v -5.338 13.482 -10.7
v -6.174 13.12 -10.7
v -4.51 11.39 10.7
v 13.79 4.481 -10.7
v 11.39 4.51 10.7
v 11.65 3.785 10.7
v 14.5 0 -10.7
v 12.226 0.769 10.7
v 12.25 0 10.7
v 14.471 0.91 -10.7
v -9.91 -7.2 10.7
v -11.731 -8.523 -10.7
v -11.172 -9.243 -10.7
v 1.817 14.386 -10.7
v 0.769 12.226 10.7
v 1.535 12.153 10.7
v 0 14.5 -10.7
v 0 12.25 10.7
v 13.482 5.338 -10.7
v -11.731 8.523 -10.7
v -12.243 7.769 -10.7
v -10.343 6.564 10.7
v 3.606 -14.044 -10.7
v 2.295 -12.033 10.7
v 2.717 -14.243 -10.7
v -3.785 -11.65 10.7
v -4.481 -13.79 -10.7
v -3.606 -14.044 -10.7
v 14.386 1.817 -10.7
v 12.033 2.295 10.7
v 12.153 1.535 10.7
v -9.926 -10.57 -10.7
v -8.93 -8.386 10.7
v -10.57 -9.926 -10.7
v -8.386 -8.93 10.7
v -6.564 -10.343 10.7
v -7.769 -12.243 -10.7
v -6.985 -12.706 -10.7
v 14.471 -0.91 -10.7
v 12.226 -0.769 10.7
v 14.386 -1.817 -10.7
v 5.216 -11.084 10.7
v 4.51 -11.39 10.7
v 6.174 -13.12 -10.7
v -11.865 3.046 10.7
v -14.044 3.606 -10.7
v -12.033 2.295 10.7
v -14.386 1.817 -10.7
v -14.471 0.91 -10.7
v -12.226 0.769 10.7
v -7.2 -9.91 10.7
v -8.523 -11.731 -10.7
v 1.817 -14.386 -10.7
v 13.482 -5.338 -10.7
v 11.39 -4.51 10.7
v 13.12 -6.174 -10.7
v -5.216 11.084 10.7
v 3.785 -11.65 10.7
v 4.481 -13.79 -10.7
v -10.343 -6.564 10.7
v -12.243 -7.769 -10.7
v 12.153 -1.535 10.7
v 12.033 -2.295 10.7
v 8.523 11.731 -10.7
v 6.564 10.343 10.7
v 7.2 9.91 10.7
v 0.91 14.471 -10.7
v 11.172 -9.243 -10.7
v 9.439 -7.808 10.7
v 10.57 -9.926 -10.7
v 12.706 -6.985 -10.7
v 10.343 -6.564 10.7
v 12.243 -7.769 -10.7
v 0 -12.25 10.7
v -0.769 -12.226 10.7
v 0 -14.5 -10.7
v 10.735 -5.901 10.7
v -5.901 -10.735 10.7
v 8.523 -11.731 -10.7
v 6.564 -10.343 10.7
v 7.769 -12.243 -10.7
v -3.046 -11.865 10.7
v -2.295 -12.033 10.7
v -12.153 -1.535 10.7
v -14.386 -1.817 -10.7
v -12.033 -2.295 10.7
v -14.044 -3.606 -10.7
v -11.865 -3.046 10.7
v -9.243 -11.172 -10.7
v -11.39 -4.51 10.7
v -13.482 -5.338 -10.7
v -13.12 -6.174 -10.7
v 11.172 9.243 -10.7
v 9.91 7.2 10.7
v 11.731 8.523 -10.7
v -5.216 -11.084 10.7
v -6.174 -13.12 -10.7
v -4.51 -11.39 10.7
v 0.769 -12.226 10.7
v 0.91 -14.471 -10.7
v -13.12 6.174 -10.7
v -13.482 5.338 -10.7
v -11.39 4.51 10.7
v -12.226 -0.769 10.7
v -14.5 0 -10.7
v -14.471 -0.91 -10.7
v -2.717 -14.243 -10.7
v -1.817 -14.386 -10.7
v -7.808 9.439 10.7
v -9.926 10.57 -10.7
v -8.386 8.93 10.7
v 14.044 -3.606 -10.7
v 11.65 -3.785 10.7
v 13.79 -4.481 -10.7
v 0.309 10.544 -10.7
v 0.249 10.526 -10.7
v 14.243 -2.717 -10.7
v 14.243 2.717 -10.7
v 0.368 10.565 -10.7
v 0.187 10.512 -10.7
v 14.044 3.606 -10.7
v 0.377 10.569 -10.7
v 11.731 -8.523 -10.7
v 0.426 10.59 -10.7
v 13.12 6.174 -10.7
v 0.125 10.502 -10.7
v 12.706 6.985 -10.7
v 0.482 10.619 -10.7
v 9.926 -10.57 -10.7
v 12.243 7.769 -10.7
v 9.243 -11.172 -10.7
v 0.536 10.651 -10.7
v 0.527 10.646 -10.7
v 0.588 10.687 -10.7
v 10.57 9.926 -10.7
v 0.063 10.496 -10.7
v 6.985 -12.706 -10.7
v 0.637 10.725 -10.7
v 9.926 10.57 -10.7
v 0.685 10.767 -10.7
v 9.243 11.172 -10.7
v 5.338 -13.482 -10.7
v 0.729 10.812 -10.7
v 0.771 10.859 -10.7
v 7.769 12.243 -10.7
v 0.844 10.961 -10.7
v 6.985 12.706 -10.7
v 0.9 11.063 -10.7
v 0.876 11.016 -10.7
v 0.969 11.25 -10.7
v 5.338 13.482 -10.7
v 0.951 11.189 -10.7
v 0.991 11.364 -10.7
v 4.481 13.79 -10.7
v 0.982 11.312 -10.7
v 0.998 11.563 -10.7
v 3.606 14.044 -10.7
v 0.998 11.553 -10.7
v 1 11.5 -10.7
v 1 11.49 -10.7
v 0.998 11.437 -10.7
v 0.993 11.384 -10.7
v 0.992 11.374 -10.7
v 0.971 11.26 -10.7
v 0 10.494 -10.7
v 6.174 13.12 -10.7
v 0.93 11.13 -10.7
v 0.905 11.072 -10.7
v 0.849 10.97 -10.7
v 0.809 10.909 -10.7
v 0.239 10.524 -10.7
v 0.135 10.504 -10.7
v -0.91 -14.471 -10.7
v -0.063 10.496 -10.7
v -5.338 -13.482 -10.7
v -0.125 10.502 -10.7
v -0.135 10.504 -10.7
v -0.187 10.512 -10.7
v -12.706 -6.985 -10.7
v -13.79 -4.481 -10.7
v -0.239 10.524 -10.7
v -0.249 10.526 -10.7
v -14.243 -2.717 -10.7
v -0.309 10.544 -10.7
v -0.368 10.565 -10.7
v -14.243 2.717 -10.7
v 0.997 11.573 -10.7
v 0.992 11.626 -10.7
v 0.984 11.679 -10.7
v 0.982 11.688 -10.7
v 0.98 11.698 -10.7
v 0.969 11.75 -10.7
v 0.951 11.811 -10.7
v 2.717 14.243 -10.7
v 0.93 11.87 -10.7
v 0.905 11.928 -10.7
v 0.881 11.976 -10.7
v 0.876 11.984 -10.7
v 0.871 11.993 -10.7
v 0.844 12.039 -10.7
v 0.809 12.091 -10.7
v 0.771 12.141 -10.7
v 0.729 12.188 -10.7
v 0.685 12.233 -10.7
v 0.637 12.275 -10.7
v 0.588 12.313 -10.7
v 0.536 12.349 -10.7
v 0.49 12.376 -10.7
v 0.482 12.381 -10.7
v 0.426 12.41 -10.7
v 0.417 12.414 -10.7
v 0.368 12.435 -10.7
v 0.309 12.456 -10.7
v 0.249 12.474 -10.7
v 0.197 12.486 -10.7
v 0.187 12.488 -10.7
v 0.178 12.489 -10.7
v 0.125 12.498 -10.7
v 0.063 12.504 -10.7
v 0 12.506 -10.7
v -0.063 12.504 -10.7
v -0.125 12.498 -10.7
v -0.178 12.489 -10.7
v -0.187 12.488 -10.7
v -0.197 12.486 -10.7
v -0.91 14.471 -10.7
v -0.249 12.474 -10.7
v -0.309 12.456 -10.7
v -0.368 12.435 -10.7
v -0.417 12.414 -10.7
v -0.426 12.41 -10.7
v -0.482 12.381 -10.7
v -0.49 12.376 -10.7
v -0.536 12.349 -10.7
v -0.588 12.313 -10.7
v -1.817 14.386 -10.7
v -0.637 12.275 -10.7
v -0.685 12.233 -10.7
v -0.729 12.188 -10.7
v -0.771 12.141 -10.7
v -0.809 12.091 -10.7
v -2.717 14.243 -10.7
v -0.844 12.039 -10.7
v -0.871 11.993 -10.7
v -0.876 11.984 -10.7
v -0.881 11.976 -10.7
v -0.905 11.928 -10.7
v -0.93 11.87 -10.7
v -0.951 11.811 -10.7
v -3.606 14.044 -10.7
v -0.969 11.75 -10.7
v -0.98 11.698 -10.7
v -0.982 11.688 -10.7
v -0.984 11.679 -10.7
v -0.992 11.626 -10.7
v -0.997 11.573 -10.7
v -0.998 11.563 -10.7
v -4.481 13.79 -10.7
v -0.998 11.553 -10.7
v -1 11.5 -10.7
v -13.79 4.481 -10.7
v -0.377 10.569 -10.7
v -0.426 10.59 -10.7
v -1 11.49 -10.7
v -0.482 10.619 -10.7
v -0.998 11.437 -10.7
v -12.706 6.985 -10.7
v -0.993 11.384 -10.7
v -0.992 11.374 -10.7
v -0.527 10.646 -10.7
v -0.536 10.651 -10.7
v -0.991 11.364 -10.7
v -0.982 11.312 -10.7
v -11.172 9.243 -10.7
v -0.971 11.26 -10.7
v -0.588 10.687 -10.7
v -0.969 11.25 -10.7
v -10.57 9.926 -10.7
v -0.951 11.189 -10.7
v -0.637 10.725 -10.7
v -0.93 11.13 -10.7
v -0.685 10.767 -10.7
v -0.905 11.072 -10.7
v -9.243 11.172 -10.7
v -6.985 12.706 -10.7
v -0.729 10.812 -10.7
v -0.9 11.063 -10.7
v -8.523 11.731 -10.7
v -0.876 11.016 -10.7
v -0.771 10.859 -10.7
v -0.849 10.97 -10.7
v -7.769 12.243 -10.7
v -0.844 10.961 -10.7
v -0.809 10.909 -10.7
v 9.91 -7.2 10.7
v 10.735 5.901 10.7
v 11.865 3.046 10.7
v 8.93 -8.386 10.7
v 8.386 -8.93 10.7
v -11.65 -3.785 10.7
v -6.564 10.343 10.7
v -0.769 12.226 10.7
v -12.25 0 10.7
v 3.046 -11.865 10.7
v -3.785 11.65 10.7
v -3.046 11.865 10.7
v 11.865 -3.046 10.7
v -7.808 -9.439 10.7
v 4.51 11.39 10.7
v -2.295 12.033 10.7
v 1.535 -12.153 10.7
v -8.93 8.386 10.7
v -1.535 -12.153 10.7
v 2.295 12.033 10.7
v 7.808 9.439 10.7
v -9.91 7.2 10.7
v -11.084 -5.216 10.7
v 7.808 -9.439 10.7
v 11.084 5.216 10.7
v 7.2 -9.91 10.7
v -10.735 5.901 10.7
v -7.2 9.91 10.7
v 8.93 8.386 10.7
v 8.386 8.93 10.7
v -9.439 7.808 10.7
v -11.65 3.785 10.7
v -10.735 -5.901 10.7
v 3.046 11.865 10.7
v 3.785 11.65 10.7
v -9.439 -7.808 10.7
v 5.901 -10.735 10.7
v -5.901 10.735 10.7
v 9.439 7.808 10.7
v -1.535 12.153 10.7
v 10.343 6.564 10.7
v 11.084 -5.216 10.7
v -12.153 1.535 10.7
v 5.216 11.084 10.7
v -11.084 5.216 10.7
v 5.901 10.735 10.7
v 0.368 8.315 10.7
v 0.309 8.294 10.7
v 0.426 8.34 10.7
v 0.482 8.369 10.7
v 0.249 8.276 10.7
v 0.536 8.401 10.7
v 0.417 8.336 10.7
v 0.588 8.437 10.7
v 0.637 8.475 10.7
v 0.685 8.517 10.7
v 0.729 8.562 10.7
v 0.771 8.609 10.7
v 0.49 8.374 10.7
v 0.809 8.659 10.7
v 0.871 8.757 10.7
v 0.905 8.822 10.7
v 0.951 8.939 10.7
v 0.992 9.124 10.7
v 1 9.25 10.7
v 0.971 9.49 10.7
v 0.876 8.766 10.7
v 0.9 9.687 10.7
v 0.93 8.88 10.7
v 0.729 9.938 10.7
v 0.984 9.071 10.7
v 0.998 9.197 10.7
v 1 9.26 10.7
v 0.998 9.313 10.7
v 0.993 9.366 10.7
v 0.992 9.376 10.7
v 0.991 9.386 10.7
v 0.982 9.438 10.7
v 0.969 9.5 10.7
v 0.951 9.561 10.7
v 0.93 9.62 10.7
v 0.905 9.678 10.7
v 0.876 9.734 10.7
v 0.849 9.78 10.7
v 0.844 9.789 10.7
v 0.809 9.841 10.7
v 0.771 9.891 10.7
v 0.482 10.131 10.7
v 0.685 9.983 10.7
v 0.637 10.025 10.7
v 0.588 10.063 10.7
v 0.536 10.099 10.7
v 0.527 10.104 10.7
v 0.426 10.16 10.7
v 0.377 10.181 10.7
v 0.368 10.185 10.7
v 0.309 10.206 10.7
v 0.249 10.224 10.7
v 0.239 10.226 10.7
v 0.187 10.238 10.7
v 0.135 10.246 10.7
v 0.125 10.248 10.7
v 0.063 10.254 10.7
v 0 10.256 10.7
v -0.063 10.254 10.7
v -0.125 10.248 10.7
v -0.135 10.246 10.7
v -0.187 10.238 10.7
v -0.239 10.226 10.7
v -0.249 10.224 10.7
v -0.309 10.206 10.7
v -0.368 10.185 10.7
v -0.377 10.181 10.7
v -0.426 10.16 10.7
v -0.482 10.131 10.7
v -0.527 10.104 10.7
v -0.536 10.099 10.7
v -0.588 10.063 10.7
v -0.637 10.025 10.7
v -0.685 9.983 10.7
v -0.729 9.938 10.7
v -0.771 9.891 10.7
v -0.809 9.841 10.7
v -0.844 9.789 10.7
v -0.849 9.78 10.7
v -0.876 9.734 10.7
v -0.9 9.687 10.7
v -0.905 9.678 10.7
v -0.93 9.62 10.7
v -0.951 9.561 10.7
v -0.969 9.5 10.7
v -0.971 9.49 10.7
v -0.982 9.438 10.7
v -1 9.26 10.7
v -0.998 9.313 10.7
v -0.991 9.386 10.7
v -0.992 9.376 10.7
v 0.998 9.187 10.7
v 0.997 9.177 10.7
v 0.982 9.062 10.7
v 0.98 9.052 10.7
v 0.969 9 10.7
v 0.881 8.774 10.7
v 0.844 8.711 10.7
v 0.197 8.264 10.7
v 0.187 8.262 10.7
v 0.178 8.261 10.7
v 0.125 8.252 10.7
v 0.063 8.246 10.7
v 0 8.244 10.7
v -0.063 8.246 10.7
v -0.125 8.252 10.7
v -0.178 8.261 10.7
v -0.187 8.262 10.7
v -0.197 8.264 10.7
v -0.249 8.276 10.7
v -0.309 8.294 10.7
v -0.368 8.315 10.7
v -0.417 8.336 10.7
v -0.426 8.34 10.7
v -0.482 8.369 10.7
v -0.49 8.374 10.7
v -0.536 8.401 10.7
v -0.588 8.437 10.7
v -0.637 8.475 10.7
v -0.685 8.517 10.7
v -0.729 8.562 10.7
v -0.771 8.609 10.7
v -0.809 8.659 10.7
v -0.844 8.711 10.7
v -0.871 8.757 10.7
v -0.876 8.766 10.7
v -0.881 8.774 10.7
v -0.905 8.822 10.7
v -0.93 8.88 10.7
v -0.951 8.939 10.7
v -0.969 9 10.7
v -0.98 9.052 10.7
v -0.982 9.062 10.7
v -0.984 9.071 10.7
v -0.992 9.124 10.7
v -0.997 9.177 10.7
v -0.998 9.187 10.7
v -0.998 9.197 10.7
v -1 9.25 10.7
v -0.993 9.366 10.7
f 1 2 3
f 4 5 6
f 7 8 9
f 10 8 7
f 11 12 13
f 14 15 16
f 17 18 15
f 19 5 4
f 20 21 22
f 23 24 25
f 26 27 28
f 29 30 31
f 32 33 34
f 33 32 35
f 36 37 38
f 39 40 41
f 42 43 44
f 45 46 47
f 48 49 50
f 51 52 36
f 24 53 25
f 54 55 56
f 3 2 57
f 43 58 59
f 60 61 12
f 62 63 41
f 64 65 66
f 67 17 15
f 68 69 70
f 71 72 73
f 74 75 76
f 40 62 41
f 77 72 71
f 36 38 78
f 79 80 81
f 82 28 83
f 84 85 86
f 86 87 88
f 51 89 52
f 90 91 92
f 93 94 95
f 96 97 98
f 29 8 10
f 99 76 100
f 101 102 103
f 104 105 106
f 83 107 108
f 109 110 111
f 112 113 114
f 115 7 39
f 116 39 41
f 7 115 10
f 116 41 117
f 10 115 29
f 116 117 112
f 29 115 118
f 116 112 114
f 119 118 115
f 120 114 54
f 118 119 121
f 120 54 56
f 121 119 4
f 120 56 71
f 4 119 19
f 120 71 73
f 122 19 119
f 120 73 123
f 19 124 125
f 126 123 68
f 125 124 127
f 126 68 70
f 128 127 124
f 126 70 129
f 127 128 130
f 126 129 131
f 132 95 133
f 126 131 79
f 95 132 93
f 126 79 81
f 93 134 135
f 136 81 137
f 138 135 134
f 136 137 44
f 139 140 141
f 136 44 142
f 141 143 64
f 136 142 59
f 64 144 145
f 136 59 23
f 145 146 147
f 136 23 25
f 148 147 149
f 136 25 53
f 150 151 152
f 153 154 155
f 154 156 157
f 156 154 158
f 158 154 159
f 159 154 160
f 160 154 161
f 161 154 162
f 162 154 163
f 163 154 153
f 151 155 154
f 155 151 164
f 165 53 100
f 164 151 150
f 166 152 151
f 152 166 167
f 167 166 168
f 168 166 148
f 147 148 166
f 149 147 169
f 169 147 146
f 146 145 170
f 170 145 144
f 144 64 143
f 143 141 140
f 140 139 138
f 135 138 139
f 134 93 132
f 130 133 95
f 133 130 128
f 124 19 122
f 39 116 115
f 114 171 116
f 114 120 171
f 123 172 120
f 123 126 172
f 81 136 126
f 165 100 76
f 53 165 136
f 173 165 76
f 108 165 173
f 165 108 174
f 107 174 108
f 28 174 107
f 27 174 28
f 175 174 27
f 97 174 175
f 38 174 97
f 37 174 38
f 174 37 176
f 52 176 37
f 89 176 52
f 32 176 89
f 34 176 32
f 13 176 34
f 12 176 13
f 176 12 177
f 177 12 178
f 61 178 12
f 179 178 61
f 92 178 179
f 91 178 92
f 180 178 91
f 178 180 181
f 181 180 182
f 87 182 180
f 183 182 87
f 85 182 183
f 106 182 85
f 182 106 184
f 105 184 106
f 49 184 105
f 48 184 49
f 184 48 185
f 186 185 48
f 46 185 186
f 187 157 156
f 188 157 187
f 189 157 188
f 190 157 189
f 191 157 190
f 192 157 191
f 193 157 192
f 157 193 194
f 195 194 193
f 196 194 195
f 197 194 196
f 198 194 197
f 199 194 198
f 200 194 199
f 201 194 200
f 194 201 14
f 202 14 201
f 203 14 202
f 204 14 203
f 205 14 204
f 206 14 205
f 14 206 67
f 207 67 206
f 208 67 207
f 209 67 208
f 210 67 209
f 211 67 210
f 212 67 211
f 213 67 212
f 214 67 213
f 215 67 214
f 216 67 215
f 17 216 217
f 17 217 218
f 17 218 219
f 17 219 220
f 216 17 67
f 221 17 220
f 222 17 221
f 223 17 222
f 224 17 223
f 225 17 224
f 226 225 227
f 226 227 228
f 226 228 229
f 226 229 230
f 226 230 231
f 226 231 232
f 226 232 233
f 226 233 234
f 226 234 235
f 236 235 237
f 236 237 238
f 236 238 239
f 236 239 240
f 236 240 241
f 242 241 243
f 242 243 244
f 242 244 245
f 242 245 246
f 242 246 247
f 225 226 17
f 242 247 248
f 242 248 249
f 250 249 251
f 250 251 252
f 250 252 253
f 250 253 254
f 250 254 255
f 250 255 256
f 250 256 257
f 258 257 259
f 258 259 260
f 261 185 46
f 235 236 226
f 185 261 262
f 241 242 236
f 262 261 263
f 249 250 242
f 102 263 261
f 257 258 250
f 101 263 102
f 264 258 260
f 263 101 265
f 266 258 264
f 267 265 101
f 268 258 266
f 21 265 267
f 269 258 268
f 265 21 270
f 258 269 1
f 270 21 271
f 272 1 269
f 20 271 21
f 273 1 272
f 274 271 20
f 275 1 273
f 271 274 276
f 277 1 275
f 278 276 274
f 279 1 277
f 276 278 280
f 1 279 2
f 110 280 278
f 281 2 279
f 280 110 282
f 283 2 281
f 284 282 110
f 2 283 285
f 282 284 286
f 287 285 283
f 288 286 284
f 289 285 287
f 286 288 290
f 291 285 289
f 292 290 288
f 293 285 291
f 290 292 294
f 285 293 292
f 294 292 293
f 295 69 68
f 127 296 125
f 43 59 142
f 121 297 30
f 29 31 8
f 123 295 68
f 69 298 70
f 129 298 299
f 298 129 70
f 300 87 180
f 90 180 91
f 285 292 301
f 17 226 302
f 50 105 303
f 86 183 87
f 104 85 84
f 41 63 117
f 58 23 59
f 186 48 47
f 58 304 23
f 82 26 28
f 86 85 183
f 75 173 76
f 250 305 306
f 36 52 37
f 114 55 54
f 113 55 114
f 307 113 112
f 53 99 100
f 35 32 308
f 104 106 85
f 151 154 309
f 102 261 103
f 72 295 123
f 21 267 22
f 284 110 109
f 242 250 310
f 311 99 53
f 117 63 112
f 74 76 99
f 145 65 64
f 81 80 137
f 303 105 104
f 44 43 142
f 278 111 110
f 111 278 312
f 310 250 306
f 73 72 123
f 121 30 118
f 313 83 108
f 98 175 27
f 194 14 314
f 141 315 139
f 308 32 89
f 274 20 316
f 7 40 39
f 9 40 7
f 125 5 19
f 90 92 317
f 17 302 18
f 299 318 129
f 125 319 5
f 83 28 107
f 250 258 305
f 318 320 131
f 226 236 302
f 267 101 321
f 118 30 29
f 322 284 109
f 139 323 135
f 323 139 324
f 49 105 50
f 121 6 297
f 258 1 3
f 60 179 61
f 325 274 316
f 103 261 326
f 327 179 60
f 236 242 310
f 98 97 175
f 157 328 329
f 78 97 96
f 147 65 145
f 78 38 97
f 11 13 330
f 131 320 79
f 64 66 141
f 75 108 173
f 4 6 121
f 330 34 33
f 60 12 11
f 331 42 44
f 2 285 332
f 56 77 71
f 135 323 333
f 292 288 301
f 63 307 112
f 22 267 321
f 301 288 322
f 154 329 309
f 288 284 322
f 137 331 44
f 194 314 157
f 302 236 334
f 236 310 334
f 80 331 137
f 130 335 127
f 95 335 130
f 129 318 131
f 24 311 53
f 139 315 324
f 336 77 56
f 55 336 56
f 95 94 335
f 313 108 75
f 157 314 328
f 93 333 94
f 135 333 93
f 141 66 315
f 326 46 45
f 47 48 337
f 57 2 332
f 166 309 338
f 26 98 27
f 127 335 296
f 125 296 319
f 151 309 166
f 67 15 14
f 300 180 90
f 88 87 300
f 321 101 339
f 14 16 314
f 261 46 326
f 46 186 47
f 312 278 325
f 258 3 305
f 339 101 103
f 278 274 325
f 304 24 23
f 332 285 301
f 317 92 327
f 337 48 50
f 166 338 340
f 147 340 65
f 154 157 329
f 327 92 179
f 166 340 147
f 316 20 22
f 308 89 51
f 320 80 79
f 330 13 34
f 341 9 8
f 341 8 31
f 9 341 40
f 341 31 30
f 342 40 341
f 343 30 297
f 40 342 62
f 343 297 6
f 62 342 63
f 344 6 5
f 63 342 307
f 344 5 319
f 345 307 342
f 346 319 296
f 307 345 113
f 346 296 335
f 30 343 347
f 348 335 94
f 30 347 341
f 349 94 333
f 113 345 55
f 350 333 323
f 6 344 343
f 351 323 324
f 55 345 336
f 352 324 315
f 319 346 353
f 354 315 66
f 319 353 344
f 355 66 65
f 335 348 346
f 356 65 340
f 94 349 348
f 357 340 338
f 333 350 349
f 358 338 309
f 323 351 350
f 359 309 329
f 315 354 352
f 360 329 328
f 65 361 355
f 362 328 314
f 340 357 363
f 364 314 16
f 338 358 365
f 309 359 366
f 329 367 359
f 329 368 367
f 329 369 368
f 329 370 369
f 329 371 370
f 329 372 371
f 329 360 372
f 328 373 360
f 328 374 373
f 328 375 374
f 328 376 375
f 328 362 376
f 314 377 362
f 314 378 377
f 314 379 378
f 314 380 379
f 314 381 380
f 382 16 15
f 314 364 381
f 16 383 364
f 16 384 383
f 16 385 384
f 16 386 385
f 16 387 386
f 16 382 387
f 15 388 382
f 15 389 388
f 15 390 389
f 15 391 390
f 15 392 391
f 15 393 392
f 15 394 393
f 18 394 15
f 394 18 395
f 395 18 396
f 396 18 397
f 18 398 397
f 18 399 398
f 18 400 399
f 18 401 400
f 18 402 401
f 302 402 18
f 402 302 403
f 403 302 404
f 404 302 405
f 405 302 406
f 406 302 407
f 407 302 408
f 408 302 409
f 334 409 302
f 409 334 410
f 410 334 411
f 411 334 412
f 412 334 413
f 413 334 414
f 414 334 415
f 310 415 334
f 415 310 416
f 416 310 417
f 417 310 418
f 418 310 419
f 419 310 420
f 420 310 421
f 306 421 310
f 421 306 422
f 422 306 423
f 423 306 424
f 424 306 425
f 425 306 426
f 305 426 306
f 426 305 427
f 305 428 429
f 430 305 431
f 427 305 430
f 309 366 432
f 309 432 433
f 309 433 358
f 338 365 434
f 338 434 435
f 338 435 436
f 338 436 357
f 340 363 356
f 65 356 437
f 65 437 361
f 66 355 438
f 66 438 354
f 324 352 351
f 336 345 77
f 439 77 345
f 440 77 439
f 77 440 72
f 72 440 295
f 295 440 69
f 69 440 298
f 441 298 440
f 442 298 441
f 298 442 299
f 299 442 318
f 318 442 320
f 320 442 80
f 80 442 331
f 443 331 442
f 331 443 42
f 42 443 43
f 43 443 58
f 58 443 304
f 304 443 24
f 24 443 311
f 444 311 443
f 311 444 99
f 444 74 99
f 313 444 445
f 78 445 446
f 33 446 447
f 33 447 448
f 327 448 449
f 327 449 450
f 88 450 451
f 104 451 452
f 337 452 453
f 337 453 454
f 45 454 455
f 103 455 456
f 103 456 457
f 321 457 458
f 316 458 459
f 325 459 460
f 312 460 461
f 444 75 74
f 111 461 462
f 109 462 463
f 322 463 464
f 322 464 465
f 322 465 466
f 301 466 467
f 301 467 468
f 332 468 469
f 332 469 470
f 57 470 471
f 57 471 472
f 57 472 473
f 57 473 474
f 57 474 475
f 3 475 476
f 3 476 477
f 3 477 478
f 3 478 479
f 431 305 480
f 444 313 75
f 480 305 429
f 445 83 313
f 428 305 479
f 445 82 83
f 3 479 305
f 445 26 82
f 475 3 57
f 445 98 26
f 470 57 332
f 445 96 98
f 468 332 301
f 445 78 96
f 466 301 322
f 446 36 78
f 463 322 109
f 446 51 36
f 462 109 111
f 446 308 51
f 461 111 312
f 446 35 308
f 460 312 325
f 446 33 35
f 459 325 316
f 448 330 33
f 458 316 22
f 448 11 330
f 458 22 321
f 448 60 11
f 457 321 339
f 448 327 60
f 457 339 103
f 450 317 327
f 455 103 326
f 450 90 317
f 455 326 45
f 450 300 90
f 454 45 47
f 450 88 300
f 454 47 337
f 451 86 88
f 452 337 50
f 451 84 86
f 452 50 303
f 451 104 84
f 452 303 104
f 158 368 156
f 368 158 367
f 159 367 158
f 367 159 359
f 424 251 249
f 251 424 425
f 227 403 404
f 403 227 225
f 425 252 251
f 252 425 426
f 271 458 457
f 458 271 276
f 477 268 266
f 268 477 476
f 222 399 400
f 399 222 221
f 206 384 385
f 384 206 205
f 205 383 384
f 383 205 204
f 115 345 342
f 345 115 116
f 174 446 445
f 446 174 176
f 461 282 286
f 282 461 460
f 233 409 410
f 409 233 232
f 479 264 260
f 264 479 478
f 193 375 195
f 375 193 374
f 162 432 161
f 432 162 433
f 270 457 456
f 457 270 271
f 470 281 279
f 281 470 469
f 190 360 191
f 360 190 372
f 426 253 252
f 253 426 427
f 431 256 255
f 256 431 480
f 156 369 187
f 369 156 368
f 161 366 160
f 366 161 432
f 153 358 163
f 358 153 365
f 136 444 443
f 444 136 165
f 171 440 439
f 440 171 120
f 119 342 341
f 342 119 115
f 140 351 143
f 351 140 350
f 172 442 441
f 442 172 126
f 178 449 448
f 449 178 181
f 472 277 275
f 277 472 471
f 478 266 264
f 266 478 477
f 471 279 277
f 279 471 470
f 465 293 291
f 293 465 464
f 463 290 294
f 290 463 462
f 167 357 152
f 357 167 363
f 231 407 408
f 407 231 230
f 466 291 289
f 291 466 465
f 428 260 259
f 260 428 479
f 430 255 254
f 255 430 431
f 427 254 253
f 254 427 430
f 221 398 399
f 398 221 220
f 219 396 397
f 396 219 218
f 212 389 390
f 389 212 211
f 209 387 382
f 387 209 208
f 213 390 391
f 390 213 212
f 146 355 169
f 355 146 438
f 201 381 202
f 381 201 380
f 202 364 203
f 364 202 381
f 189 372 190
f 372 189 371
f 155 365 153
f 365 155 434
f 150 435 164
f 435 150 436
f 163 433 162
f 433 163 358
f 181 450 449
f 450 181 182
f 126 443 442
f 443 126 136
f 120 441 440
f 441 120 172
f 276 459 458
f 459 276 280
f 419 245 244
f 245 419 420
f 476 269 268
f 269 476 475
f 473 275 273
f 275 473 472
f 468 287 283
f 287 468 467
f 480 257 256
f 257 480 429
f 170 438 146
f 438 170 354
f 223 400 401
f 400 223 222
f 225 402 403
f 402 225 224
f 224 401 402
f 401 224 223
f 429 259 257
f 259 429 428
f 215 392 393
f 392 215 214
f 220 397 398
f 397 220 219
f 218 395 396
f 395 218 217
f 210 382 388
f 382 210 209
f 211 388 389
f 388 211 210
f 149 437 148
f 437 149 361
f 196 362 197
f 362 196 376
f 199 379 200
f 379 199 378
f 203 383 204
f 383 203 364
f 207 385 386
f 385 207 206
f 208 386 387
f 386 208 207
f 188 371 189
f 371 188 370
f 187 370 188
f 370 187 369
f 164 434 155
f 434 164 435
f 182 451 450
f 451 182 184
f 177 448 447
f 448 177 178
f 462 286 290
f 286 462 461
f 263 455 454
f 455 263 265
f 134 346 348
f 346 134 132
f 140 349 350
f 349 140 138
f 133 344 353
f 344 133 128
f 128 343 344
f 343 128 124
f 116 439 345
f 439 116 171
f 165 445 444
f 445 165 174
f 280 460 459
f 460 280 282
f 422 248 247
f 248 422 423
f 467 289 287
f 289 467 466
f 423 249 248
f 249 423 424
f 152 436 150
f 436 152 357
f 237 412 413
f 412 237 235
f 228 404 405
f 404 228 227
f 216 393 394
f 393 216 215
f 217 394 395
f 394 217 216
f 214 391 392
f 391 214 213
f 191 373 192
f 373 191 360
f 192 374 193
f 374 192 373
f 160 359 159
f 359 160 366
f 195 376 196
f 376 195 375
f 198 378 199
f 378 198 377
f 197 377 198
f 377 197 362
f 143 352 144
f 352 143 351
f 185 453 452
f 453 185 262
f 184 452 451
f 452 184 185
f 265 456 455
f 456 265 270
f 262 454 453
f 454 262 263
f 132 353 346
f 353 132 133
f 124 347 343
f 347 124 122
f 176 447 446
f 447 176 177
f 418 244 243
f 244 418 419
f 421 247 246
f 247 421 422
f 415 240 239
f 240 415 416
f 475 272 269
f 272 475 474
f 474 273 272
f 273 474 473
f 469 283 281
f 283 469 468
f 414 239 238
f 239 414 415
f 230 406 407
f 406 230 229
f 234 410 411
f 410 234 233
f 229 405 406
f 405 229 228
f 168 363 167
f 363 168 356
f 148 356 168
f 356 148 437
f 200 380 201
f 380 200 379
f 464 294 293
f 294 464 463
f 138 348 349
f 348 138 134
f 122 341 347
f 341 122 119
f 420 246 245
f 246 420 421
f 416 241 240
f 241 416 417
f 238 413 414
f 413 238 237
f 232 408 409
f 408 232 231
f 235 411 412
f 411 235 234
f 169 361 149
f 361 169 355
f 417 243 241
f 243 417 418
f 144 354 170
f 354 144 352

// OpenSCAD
$fn=100*1;

//larger width radius (half the diameter)
radius1=14.5; 

//shorter width radius (half the diameter)
radius2=12.25; 

// height
height=21.4; 

//angle for the air hole
angle=atan((radius1-radius2)/height);

difference(){
	cylinder(h=height,r1=radius1, r2=radius2, center=true);
		translate([0,(radius1+radius2)/2-3,0])rotate([angle,0,0])cylinder(h=height+10,r=1, center=true);

}
